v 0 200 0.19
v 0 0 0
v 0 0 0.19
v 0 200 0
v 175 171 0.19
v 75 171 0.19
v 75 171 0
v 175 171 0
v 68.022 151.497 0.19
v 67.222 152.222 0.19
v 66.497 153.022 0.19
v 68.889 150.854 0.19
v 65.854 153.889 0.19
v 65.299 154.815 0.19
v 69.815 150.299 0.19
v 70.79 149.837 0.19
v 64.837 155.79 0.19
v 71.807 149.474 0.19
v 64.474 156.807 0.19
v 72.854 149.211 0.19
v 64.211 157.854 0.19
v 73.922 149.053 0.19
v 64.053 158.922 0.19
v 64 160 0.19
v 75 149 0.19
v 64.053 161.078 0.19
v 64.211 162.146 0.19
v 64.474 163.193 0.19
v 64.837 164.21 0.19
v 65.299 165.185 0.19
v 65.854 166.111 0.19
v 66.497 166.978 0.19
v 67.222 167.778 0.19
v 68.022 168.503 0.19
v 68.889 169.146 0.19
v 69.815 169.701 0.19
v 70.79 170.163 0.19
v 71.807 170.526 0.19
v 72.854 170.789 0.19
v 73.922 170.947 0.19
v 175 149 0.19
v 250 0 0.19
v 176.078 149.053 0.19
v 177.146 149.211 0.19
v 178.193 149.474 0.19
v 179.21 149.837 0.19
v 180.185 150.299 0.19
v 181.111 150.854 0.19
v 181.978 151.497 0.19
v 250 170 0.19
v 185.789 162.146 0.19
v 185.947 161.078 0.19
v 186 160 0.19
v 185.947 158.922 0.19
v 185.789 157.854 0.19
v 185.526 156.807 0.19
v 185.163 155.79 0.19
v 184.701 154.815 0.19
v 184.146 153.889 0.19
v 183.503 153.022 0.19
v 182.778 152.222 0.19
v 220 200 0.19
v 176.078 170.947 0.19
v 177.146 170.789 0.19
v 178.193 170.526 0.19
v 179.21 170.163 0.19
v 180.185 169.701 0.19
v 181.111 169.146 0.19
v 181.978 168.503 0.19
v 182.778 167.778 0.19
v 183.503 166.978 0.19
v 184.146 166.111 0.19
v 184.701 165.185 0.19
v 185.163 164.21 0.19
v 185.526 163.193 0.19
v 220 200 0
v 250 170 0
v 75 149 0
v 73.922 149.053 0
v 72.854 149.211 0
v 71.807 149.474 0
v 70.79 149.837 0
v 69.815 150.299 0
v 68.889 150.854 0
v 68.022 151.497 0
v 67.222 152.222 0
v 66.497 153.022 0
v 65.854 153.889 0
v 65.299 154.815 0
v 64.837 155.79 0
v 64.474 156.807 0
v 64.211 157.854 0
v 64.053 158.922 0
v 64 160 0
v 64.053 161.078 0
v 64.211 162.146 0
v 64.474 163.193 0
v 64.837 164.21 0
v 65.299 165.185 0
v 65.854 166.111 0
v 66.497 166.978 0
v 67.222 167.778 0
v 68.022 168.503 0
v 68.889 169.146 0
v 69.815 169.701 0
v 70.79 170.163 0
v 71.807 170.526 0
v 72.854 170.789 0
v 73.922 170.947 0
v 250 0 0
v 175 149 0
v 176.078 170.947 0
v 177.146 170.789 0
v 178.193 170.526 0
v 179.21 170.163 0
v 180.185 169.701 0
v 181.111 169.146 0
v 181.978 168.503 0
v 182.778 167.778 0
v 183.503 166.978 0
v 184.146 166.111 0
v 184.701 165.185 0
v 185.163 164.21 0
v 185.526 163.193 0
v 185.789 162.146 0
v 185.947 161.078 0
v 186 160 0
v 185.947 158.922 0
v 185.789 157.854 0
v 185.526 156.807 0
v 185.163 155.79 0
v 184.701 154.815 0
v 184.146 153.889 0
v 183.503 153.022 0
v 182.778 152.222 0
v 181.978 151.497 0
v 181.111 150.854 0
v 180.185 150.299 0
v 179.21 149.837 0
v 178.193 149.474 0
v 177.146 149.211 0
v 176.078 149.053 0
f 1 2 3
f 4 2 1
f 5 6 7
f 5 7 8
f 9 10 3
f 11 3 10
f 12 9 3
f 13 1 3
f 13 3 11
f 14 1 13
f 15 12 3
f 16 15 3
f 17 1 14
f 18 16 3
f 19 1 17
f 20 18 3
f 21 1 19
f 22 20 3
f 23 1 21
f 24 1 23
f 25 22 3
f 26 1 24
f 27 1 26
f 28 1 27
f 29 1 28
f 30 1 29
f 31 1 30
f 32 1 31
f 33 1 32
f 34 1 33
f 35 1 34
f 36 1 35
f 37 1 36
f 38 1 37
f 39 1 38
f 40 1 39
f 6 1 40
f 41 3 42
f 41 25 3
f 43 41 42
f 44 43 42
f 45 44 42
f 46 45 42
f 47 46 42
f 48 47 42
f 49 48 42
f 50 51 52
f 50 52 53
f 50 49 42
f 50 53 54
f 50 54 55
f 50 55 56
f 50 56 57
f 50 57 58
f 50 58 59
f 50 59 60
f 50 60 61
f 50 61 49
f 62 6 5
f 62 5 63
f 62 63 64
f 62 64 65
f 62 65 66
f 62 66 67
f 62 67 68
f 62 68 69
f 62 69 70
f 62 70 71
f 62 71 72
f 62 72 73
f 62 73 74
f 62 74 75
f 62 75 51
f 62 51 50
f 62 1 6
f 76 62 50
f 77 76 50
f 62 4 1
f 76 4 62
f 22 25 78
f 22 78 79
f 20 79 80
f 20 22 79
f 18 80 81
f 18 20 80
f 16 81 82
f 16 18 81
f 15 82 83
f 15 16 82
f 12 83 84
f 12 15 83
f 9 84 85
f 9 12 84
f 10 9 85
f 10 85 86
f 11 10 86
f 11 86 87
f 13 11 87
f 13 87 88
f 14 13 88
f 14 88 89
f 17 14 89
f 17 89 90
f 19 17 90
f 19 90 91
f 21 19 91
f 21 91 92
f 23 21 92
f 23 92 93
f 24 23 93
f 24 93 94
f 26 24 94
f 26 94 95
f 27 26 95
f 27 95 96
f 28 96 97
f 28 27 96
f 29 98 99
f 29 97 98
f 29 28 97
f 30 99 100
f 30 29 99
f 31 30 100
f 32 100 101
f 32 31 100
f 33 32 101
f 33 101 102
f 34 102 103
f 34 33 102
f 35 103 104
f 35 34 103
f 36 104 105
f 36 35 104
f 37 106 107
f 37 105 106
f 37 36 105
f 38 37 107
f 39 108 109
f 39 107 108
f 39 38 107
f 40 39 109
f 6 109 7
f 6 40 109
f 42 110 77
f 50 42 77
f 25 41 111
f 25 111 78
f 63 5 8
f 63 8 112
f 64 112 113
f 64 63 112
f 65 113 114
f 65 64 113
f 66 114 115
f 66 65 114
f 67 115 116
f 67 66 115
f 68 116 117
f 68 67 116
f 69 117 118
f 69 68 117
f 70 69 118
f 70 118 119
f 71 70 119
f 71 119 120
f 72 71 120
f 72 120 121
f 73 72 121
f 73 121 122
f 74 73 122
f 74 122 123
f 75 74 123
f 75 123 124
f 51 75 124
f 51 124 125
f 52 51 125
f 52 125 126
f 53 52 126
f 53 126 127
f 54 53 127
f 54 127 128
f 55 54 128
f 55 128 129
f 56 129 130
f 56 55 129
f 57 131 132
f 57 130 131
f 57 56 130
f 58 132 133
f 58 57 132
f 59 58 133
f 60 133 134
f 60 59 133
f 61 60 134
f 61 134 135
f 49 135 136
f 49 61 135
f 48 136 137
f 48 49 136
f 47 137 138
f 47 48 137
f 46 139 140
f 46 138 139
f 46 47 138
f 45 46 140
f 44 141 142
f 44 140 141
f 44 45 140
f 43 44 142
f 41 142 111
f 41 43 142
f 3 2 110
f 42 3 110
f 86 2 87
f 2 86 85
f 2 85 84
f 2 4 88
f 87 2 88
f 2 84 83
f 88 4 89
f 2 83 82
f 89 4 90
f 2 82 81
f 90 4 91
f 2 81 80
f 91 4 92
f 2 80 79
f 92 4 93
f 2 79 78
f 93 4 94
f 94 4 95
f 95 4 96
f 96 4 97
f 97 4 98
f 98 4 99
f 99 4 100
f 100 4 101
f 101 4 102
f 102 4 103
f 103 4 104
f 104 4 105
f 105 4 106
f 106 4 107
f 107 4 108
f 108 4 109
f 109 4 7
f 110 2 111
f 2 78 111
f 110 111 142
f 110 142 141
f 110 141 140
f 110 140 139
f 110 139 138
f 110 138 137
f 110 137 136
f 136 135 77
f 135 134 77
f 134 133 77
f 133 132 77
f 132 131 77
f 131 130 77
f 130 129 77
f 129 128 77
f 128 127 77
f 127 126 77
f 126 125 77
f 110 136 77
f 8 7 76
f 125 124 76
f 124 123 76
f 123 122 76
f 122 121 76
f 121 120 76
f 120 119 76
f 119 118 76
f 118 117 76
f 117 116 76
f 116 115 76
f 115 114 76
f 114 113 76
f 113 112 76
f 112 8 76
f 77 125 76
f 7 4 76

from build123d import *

# Parameters (mm, degrees)
SKIZZE1_W                       = 250
SKIZZE1_H                       = 200
AUFSATZ_LINEAR_AUSTRAGEN1_DEPTH = 0.19
SCHNITT_LINEAR_AUSTRAGEN1_DEPTH = 1.19


with BuildPart() as part:
    # Skizze1 → Aufsatz-Linear austragen1 (new body)
    with BuildSketch(Plane.XY):
        with Locations((125, 100)):
            Rectangle(SKIZZE1_W, SKIZZE1_H)
    extrude(amount=AUFSATZ_LINEAR_AUSTRAGEN1_DEPTH)

    # Skizze2 → Schnitt-Linear austragen1 (cut, through all)
    with BuildSketch(Plane.XY.offset(0.19)):
        with BuildLine():
            Line((75, 171), (175, 171))
            ThreePointArc((175, 171), (186, 160), (175, 149))
            Line((175, 149), (75, 149))
            ThreePointArc((75, 149), (64, 160), (75, 171))
        make_face()
        Polygon((220, 200), (250, 170), (250, 200), align=None)
    extrude(amount=-SCHNITT_LINEAR_AUSTRAGEN1_DEPTH, mode=Mode.SUBTRACT)


solid = part.part
